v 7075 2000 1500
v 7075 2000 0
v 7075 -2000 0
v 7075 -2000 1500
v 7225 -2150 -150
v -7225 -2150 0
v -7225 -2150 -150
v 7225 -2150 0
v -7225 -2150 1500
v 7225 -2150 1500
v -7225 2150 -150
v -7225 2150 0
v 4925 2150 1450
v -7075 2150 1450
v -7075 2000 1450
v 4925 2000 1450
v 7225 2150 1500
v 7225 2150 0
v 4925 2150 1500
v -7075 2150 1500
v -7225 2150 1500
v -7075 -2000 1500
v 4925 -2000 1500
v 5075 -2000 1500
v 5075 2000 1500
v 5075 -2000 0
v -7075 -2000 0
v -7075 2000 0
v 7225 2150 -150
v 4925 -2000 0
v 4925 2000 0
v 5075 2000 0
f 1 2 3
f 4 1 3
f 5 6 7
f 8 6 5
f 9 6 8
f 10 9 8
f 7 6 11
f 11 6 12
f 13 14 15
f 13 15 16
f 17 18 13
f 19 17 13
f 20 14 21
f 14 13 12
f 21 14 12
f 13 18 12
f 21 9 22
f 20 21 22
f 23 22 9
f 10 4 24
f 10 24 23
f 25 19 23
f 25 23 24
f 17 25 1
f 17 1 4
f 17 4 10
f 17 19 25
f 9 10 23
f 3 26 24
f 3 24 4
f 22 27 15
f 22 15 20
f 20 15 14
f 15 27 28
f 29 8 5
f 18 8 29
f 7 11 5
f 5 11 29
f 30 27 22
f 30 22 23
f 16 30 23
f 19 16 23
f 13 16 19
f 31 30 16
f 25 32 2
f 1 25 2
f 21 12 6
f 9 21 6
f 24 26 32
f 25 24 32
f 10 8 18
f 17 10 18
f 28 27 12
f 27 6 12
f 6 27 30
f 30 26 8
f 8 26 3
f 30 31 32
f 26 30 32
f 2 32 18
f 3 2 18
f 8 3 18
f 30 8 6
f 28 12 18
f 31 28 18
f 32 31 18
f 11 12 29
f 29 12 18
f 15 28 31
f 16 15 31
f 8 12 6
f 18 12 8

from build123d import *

# Parameters (mm, degrees)
F0_W     = 14450
F0_H     = 4300
F1_DEPTH = 150
F2_W     = 12000
F2_H     = 150
F2_W_2   = 150
F2_H_2   = 4000
F2_W_3   = 2000
F3_DEPTH = 1500
F4_W     = 12000
F4_H     = 150
F5_DEPTH = 50


with BuildPart() as f1:
    # F0 (on Top) → F1 (new body)
    with BuildSketch(Plane.XY):
        Rectangle(F0_W, F0_H)
    extrude(amount=-F1_DEPTH)


with BuildPart() as f3:
    # F2 (on face) → F3 (new body)
    with BuildSketch(Plane.XY):
        Polygon((-7075, 2150), (-7225, 2150), (-7225, -2150), (-7075, -2150), (-7075, -2000), (-7075, 2000), align=None)
        with Locations((-1075, 2075)):
            Rectangle(F2_W, F2_H)
        with Locations((-1075, -2075)):
            Rectangle(F2_W, F2_H)
        with Locations((5000, 0)):
            Rectangle(F2_W_2, F2_H_2)
        with Locations((5000, 2075)):
            Rectangle(F2_W_2, F2_H)
        with Locations((6075, 2075)):
            Rectangle(F2_W_3, F2_H)
        with Locations((7150, 0)):
            Rectangle(F2_W_2, F2_H_2)
        with Locations((7150, 2075)):
            Rectangle(F2_W_2, F2_H)
        with Locations((7150, -2075)):
            Rectangle(F2_W_2, F2_H)
        with Locations((6075, -2075)):
            Rectangle(F2_W_3, F2_H)
        with Locations((5000, -2075)):
            Rectangle(F2_W_2, F2_H)
    extrude(amount=F3_DEPTH)

    # F4 (on face) → F5 (cut)
    with BuildSketch(Plane.XY.offset(1500)):
        with Locations((-1075, 2075)):
            Rectangle(F4_W, F4_H)
    extrude(amount=-F5_DEPTH, mode=Mode.SUBTRACT)


solid = Compound([f1.part, f3.part])
